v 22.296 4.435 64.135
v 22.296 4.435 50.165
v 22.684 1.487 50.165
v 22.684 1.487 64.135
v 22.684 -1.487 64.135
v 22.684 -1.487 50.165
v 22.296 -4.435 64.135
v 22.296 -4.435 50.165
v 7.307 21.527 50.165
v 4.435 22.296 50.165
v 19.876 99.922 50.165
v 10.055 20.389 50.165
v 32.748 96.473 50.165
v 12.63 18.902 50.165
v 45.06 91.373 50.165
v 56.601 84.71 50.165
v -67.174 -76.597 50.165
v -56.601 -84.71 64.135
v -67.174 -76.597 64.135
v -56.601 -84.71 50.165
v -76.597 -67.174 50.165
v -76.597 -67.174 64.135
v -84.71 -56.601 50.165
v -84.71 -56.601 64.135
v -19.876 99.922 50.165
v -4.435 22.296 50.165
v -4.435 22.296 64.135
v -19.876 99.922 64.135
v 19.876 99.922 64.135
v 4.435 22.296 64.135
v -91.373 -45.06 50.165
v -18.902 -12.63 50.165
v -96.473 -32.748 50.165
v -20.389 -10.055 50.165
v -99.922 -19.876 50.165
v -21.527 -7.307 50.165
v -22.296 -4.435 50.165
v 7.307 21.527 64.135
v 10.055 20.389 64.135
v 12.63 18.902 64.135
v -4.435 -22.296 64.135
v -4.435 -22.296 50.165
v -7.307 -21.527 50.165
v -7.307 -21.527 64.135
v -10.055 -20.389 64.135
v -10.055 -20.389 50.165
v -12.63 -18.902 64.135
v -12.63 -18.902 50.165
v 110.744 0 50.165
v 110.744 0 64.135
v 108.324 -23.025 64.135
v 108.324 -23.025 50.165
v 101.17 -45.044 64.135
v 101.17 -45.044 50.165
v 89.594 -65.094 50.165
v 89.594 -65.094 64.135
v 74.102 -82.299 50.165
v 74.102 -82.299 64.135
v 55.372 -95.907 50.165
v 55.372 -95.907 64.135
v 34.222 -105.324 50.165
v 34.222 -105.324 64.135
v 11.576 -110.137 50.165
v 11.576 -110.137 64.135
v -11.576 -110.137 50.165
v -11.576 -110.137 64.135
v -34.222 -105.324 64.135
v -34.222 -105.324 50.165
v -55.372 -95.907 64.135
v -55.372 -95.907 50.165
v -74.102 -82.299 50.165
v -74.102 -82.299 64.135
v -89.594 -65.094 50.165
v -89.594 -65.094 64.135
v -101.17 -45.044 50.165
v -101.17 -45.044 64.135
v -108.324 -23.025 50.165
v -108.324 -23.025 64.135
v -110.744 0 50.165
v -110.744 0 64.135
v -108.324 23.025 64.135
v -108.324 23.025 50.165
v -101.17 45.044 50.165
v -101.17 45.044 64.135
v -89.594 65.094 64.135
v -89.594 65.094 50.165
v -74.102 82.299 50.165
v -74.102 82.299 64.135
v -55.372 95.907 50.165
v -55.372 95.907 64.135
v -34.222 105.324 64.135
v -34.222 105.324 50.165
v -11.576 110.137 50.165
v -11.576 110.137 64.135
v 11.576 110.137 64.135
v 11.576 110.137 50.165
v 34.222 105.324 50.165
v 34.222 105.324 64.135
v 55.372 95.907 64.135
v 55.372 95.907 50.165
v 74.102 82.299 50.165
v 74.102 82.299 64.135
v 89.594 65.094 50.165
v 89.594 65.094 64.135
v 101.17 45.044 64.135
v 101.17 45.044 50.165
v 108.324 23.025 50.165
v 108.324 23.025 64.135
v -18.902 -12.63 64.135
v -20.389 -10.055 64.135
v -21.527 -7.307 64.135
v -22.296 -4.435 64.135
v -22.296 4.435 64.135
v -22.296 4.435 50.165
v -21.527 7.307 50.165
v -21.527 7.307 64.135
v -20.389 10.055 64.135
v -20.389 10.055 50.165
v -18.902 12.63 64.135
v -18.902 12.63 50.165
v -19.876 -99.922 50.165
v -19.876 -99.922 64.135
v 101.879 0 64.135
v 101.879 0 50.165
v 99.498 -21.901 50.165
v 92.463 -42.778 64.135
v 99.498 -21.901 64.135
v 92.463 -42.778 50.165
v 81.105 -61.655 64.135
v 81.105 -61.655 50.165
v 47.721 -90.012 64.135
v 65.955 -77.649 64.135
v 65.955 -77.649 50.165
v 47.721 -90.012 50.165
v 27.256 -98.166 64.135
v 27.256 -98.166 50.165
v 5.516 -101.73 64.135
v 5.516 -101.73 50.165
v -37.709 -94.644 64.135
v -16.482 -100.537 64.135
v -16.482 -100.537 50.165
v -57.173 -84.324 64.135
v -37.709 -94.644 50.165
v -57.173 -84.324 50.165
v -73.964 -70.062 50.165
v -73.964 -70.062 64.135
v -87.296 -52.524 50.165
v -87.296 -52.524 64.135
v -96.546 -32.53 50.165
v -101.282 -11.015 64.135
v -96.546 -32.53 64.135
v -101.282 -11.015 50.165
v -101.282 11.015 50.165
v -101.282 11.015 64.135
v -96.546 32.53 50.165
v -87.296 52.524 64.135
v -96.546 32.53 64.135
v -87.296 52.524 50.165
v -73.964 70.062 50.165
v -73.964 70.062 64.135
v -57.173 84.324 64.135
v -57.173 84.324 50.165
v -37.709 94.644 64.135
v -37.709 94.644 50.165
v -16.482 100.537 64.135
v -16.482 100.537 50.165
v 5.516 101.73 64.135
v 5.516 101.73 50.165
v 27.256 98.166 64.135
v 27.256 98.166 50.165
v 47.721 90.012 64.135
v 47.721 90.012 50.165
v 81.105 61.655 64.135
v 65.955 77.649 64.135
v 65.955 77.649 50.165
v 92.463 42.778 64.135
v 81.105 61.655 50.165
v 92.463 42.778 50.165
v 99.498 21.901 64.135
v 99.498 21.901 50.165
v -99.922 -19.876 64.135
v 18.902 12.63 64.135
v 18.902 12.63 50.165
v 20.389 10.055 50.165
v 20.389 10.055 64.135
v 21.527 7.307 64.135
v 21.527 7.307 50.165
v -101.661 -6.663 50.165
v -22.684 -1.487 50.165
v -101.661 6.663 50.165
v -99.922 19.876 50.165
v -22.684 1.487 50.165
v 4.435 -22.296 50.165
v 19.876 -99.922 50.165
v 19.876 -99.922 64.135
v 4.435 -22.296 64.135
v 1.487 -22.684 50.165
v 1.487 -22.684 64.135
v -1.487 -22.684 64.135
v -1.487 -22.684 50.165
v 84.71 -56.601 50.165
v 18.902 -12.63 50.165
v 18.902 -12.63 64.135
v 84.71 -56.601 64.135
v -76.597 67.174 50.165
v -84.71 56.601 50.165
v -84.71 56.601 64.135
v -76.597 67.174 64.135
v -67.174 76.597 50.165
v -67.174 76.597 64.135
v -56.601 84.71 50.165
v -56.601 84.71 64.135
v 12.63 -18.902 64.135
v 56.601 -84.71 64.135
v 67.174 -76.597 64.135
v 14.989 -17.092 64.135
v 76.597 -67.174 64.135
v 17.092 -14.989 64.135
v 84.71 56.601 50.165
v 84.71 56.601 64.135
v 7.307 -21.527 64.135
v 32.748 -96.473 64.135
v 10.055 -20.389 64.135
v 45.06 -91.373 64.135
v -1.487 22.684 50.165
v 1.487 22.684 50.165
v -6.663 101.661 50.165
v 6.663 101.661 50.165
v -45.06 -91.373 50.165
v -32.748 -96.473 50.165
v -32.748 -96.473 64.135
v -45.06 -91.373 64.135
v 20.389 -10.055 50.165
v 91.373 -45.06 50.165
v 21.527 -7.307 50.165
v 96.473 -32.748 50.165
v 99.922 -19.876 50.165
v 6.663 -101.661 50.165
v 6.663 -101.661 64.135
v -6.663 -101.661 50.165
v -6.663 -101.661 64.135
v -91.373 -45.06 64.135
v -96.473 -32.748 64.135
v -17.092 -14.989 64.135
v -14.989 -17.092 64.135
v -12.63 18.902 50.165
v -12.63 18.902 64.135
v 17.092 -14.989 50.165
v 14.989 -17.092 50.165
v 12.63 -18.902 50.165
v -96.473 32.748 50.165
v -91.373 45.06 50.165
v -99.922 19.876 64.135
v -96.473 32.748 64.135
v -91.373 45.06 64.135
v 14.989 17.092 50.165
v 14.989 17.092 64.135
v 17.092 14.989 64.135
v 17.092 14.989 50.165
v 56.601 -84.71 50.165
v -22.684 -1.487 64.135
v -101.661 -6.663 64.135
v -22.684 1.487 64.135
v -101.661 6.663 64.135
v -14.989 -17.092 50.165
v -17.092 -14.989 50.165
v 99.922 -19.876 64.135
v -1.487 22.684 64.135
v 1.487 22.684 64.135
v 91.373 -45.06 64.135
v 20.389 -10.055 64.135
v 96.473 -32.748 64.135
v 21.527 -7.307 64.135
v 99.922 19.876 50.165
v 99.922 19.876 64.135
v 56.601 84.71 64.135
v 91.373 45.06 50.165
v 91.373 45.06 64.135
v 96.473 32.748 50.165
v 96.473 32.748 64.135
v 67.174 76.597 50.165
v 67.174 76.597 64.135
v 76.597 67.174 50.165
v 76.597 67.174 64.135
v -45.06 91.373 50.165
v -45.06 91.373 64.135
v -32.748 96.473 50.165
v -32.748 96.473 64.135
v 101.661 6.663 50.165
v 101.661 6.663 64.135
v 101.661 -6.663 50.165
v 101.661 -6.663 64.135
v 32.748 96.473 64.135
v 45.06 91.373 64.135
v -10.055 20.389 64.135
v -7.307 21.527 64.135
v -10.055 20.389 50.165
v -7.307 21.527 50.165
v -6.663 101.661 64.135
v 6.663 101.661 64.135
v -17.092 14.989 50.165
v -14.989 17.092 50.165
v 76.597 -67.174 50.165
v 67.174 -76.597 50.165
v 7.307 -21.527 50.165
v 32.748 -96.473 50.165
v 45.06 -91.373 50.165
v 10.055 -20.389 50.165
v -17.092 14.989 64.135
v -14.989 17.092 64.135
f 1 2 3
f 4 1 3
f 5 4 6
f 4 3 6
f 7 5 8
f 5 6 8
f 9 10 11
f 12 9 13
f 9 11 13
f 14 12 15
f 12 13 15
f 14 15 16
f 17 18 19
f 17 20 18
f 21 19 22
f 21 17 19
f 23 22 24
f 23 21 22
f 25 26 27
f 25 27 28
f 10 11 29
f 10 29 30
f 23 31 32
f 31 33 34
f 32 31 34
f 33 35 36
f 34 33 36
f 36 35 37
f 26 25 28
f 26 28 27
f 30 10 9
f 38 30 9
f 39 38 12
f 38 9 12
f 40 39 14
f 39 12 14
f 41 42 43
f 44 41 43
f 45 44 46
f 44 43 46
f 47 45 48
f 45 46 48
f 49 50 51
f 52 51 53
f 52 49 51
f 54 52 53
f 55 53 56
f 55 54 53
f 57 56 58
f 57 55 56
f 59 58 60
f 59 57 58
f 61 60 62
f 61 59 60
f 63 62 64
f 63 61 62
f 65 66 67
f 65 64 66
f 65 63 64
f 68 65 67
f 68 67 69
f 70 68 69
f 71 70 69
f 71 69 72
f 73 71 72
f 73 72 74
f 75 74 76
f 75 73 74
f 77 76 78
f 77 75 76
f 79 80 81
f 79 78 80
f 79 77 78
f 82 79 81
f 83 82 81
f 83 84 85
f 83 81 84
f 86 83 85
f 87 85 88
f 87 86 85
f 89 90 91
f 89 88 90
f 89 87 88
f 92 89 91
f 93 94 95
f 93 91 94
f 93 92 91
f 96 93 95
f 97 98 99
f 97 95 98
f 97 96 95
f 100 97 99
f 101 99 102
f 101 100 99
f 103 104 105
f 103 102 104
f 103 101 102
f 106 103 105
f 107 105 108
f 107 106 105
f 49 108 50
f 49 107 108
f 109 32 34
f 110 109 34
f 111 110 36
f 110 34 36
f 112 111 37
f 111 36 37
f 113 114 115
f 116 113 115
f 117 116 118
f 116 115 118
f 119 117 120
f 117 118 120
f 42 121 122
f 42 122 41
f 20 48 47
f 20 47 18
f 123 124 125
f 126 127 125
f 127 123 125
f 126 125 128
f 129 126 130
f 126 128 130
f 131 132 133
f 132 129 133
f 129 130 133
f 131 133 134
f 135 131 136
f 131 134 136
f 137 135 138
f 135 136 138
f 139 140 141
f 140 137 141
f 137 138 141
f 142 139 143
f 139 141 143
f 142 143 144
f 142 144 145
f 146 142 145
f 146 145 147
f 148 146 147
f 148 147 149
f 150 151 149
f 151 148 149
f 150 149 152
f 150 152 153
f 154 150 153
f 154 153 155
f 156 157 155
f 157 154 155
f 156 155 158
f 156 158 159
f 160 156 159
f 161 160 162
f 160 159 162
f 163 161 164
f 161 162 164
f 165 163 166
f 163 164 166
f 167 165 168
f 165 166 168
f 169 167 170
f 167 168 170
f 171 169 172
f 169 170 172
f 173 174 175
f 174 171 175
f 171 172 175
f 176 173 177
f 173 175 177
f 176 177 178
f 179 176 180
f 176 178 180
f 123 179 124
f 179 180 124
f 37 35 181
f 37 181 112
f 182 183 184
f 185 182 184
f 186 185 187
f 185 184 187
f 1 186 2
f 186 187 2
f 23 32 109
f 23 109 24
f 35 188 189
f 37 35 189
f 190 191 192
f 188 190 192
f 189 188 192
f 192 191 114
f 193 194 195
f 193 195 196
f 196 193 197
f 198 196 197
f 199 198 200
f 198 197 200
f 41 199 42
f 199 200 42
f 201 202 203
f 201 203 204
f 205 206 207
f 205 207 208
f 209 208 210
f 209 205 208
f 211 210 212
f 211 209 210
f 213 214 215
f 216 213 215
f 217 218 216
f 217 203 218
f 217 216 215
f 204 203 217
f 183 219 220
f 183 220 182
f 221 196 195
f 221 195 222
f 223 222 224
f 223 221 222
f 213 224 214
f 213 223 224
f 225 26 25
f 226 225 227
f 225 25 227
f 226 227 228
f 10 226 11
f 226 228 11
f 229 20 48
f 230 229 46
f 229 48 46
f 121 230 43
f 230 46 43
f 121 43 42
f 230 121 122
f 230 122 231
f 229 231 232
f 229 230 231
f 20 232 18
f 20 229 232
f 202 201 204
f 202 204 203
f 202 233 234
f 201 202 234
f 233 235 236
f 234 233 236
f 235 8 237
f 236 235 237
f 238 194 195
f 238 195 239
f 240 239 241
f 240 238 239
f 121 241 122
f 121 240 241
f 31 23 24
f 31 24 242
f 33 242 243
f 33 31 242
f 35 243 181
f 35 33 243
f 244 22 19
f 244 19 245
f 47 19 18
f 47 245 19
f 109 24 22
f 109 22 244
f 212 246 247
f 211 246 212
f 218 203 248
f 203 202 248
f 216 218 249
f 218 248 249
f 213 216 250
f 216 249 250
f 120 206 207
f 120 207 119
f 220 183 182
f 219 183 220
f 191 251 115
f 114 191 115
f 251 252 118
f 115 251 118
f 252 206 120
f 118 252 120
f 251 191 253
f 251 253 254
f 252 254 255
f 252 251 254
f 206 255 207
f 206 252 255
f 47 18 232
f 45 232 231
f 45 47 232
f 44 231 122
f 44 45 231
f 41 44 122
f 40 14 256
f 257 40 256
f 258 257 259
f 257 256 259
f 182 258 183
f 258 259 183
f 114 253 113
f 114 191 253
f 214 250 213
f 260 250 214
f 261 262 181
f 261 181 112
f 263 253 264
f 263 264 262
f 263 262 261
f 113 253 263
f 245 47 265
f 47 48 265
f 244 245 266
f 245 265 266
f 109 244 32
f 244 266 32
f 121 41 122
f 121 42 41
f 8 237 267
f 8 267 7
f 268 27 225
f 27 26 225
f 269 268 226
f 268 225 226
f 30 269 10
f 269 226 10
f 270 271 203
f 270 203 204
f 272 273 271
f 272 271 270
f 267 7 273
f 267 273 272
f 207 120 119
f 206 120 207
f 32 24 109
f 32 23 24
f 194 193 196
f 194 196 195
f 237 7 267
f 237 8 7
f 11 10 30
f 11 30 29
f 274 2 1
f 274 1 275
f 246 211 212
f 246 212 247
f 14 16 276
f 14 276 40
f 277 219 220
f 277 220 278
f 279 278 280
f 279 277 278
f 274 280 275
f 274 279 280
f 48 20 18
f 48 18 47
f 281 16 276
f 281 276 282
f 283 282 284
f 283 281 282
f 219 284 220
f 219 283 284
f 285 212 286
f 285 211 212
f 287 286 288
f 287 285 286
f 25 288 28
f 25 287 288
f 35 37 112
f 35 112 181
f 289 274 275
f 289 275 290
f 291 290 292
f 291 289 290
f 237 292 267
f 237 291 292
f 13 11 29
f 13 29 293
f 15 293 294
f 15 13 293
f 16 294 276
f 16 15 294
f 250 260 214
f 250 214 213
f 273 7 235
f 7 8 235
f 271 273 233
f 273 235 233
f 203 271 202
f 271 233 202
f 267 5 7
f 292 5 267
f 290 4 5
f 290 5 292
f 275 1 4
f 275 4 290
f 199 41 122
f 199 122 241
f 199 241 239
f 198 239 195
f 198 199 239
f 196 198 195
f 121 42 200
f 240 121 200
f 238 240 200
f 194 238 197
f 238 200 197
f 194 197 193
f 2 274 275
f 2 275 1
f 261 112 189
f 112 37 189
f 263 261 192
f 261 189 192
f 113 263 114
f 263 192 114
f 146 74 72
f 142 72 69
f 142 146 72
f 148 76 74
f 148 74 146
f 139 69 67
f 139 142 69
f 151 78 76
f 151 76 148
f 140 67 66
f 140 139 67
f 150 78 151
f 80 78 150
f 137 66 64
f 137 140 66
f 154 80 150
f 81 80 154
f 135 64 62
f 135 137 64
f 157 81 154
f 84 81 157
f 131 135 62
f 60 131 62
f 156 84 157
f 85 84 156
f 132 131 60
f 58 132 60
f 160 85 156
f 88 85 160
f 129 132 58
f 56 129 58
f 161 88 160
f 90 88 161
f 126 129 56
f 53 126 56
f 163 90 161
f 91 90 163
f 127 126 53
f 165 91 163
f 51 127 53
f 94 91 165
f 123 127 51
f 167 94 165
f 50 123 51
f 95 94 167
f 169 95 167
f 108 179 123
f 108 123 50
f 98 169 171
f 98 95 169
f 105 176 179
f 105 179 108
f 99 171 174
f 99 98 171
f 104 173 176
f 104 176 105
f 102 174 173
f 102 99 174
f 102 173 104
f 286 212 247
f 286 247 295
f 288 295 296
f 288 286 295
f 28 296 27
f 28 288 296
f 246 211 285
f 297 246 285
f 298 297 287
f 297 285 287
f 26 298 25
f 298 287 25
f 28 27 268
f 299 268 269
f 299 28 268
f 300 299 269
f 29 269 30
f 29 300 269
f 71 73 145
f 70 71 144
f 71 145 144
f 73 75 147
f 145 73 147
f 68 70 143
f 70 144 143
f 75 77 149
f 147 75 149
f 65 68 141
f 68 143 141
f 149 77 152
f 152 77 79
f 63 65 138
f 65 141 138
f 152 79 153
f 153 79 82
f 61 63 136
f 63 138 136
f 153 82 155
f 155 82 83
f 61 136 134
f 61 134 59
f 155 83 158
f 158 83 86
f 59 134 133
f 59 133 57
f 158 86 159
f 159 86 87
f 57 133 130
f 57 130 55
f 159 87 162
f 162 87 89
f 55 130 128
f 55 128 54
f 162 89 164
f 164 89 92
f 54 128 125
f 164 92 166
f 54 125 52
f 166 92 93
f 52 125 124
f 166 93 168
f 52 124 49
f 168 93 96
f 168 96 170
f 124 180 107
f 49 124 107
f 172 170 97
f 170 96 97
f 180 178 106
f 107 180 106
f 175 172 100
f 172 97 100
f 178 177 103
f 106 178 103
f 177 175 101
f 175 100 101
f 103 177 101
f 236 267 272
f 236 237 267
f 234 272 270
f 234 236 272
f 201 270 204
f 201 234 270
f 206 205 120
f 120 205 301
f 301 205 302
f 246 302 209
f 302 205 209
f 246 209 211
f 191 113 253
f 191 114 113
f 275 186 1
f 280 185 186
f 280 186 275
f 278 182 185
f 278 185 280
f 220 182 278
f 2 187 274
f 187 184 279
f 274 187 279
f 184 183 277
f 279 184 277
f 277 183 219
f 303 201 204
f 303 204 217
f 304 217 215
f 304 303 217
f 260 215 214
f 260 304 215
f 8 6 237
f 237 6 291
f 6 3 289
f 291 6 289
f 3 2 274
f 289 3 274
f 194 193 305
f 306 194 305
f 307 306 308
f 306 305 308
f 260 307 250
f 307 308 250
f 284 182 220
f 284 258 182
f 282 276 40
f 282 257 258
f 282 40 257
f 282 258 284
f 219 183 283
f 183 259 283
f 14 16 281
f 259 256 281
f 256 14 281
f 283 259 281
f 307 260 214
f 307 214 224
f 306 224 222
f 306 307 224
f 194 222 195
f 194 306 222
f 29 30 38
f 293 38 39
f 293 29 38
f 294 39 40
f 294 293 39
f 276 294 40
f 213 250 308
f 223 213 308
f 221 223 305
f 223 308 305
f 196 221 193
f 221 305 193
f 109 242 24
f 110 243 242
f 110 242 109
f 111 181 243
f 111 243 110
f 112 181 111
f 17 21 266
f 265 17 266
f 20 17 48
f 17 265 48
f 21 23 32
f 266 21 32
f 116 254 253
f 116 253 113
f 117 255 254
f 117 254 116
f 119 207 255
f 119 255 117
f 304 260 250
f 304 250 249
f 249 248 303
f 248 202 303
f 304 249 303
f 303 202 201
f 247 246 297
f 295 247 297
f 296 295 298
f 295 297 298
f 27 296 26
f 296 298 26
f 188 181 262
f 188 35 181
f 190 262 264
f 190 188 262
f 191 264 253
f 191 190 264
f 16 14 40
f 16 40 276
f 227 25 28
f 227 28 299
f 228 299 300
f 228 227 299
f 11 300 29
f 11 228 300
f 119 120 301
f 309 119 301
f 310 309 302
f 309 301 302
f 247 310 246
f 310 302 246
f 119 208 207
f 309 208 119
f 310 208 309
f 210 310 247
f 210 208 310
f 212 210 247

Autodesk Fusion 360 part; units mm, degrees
ref_plane "WorkPlane1" through (0, 0, 50.165) normal (0, 0, 1) x (1, 0, 0)
sketch "Sketch1" plane through (0, 0, 50.165) normal (0, 0, 1) x (1, 0, 0)
  arc A0 (22.2962, -4.435) -> (22.2962, 4.435) centre (0, 0) ccw
  line L0 (22.2962, 4.435) -> (99.9218, 19.8757)
  arc A1 (99.9218, -19.8757) -> (99.9218, 19.8757) centre (0, 0) ccw
  line L1 (99.9218, -19.8757) -> (22.2962, -4.435)
extrude "Extrude1" add sketch "Sketch1" along normal blind 13.97 makes body 1
ref_plane "WorkPlane2" through (0, 0, 50.165) normal (0, 0, 1) x (1, 0, 0)
sketch "Sketch2" plane through (0, 0, 50.165) normal (0, 0, 1) x (1, 0, 0)
  arc A0 (22.2962, 4.435) -> (18.9018, 12.6298) centre (0, 0) ccw
  line L0 (18.9018, 12.6298) -> (84.7096, 56.6012)
  arc A1 (99.9218, 19.8757) -> (84.7096, 56.6012) centre (0, 0) ccw
  line L1 (99.9218, 19.8757) -> (22.2962, 4.435)
extrude "Extrude2" add sketch "Sketch2" along normal blind 13.97 separate body makes body 2
ref_plane "WorkPlane3" through (0, 0, 50.165) normal (0, 0, 1) x (1, 0, 0)
sketch "Sketch3" plane through (0, 0, 50.165) normal (0, 0, 1) x (1, 0, 0)
  arc A0 (18.9018, 12.6298) -> (12.6298, 18.9018) centre (0, 0) ccw
  line L0 (12.6298, 18.9018) -> (56.6012, 84.7096)
  arc A1 (84.7096, 56.6012) -> (56.6012, 84.7096) centre (0, 0) ccw
  line L1 (84.7096, 56.6012) -> (18.9018, 12.6298)
extrude "Extrude3" add sketch "Sketch3" along normal blind 13.97 separate body makes body 3
ref_plane "WorkPlane4" through (0, 0, 50.165) normal (0, 0, 1) x (1, 0, 0)
sketch "Sketch4" plane through (0, 0, 50.165) normal (0, 0, 1) x (1, 0, 0)
  arc A0 (12.6298, 18.9018) -> (4.435, 22.2962) centre (0, 0) ccw
  line L0 (4.435, 22.2962) -> (19.8757, 99.9218)
  arc A1 (56.6012, 84.7096) -> (19.8757, 99.9218) centre (0, 0) ccw
  line L1 (56.6012, 84.7096) -> (12.6298, 18.9018)
extrude "Extrude4" add sketch "Sketch4" along normal blind 13.97 separate body makes body 4
ref_plane "WorkPlane5" through (0, 0, 50.165) normal (0, 0, 1) x (1, 0, 0)
sketch "Sketch5" plane through (0, 0, 50.165) normal (0, 0, 1) x (1, 0, 0)
  arc A0 (4.435, 22.2962) -> (-4.435, 22.2962) centre (0, 0) ccw
  line L0 (-4.435, 22.2962) -> (-19.8757, 99.9218)
  arc A1 (19.8757, 99.9218) -> (-19.8757, 99.9218) centre (0, 0) ccw
  line L1 (19.8757, 99.9218) -> (4.435, 22.2962)
extrude "Extrude5" add sketch "Sketch5" along normal blind 13.97 separate body makes body 5
ref_plane "WorkPlane6" through (0, 0, 50.165) normal (0, 0, 1) x (1, 0, 0)
sketch "Sketch6" plane through (0, 0, 50.165) normal (0, 0, 1) x (1, 0, 0)
  arc A0 (-4.435, 22.2962) -> (-12.6298, 18.9018) centre (0, 0) ccw
  line L0 (-12.6298, 18.9018) -> (-56.6012, 84.7096)
  arc A1 (-19.8757, 99.9218) -> (-56.6012, 84.7096) centre (0, 0) ccw
  line L1 (-19.8757, 99.9218) -> (-4.435, 22.2962)
extrude "Extrude6" add sketch "Sketch6" along normal blind 13.97 separate body makes body 6
ref_plane "WorkPlane7" through (0, 0, 50.165) normal (0, 0, 1) x (1, 0, 0)
sketch "Sketch7" plane through (0, 0, 50.165) normal (0, 0, 1) x (1, 0, 0)
  arc A0 (-12.6298, 18.9018) -> (-18.9018, 12.6298) centre (0, 0) ccw
  line L0 (-18.9018, 12.6298) -> (-84.7096, 56.6012)
  arc A1 (-56.6012, 84.7096) -> (-84.7096, 56.6012) centre (0, 0) ccw
  line L1 (-56.6012, 84.7096) -> (-12.6298, 18.9018)
extrude "Extrude7" add sketch "Sketch7" along normal blind 13.97 separate body makes body 7
ref_plane "WorkPlane8" through (0, 0, 50.165) normal (0, 0, 1) x (1, 0, 0)
sketch "Sketch8" plane through (0, 0, 50.165) normal (0, 0, 1) x (1, 0, 0)
  arc A0 (-18.9018, 12.6298) -> (-22.2962, 4.435) centre (0, 0) ccw
  line L0 (-22.2962, 4.435) -> (-99.9218, 19.8757)
  arc A1 (-84.7096, 56.6012) -> (-99.9218, 19.8757) centre (0, 0) ccw
  line L1 (-84.7096, 56.6012) -> (-18.9018, 12.6298)
extrude "Extrude8" add sketch "Sketch8" along normal blind 13.97 separate body makes body 8
ref_plane "WorkPlane9" through (0, 0, 50.165) normal (0, 0, 1) x (1, 0, 0)
sketch "Sketch9" plane through (0, 0, 50.165) normal (0, 0, 1) x (1, 0, 0)
  arc A0 (-22.2962, 4.435) -> (-22.2962, -4.435) centre (0, 0) ccw
  line L0 (-22.2962, -4.435) -> (-99.9218, -19.8757)
  arc A1 (-99.9218, 19.8757) -> (-99.9218, -19.8757) centre (0, 0) ccw
  line L1 (-99.9218, 19.8757) -> (-22.2962, 4.435)
extrude "Extrude9" add sketch "Sketch9" along normal blind 13.97 separate body makes body 9
ref_plane "WorkPlane10" through (0, 0, 50.165) normal (0, 0, 1) x (1, 0, 0)
sketch "Sketch10" plane through (0, 0, 50.165) normal (0, 0, 1) x (1, 0, 0)
  arc A0 (-22.2962, -4.435) -> (-18.9018, -12.6298) centre (0, 0) ccw
  line L0 (-18.9018, -12.6298) -> (-84.7096, -56.6012)
  arc A1 (-99.9218, -19.8757) -> (-84.7096, -56.6012) centre (0, 0) ccw
  line L1 (-99.9218, -19.8757) -> (-22.2962, -4.435)
extrude "Extrude10" add sketch "Sketch10" along normal blind 13.97 separate body makes body 10
ref_plane "WorkPlane11" through (0, 0, 50.165) normal (0, 0, 1) x (1, 0, 0)
sketch "Sketch11" plane through (0, 0, 50.165) normal (0, 0, 1) x (1, 0, 0)
  arc A0 (-18.9018, -12.6298) -> (-12.6298, -18.9018) centre (0, 0) ccw
  line L0 (-12.6298, -18.9018) -> (-56.6012, -84.7096)
  arc A1 (-84.7096, -56.6012) -> (-56.6012, -84.7096) centre (0, 0) ccw
  line L1 (-84.7096, -56.6012) -> (-18.9018, -12.6298)
extrude "Extrude11" add sketch "Sketch11" along normal blind 13.97 separate body makes body 11
ref_plane "WorkPlane12" through (0, 0, 50.165) normal (0, 0, 1) x (1, 0, 0)
sketch "Sketch12" plane through (0, 0, 50.165) normal (0, 0, 1) x (1, 0, 0)
  arc A0 (-12.6298, -18.9018) -> (-4.435, -22.2962) centre (0, 0) ccw
  line L0 (-4.435, -22.2962) -> (-19.8757, -99.9218)
  arc A1 (-56.6012, -84.7096) -> (-19.8757, -99.9218) centre (0, 0) ccw
  line L1 (-56.6012, -84.7096) -> (-12.6298, -18.9018)
extrude "Extrude12" add sketch "Sketch12" along normal blind 13.97 separate body makes body 12
ref_plane "WorkPlane13" through (0, 0, 50.165) normal (0, 0, 1) x (1, 0, 0)
sketch "Sketch13" plane through (0, 0, 50.165) normal (0, 0, 1) x (1, 0, 0)
  arc A0 (-4.435, -22.2962) -> (4.435, -22.2962) centre (0, 0) ccw
  line L0 (4.435, -22.2962) -> (19.8757, -99.9218)
  arc A1 (-19.8757, -99.9218) -> (19.8757, -99.9218) centre (0, 0) ccw
  line L1 (-19.8757, -99.9218) -> (-4.435, -22.2962)
extrude "Extrude13" add sketch "Sketch13" along normal blind 13.97 separate body makes body 13
ref_plane "WorkPlane14" through (0, 0, 50.165) normal (0, 0, 1) x (1, 0, 0)
sketch "Sketch14" plane through (0, 0, 50.165) normal (0, 0, 1) x (1, 0, 0)
  arc A0 (4.435, -22.2962) -> (12.6298, -18.9018) centre (0, 0) ccw
  line L0 (12.6298, -18.9018) -> (56.6012, -84.7096)
  arc A1 (19.8757, -99.9218) -> (56.6012, -84.7096) centre (0, 0) ccw
  line L1 (19.8757, -99.9218) -> (4.435, -22.2962)
extrude "Extrude14" add sketch "Sketch14" along normal blind 13.97 separate body makes body 14
ref_plane "WorkPlane15" through (0, 0, 50.165) normal (0, 0, 1) x (1, 0, 0)
sketch "Sketch15" plane through (0, 0, 50.165) normal (0, 0, 1) x (1, 0, 0)
  arc A0 (12.6298, -18.9018) -> (18.9018, -12.6298) centre (0, 0) ccw
  line L0 (18.9018, -12.6298) -> (84.7096, -56.6012)
  arc A1 (56.6012, -84.7096) -> (84.7096, -56.6012) centre (0, 0) ccw
  line L1 (56.6012, -84.7096) -> (12.6298, -18.9018)
extrude "Extrude15" add sketch "Sketch15" along normal blind 13.97 separate body makes body 15
ref_plane "WorkPlane16" through (0, 0, 50.165) normal (0, 0, 1) x (1, 0, 0)
sketch "Sketch16" plane through (0, 0, 50.165) normal (0, 0, 1) x (1, 0, 0)
  arc A0 (18.9018, -12.6298) -> (22.2962, -4.435) centre (0, 0) ccw
  line L0 (22.2962, -4.435) -> (99.9218, -19.8757)
  arc A1 (84.7096, -56.6012) -> (99.9218, -19.8757) centre (0, 0) ccw
  line L1 (84.7096, -56.6012) -> (18.9018, -12.6298)
extrude "Extrude16" add sketch "Sketch16" along normal blind 13.97 separate body makes body 16
ref_plane "WorkPlane17" through (0, 0, 50.165) normal (0, 0, 1) x (1, 0, 0)
sketch "Sketch17" plane through (0, 0, 50.165) normal (0, 0, 1) x (1, 0, 0)
  circle A0 centre (0, 0) radius 110.744
  circle A1 centre (0, 0) radius 101.8794
extrude "Extrude17" add sketch "Sketch17" along normal blind 13.97 separate body makes body 17
